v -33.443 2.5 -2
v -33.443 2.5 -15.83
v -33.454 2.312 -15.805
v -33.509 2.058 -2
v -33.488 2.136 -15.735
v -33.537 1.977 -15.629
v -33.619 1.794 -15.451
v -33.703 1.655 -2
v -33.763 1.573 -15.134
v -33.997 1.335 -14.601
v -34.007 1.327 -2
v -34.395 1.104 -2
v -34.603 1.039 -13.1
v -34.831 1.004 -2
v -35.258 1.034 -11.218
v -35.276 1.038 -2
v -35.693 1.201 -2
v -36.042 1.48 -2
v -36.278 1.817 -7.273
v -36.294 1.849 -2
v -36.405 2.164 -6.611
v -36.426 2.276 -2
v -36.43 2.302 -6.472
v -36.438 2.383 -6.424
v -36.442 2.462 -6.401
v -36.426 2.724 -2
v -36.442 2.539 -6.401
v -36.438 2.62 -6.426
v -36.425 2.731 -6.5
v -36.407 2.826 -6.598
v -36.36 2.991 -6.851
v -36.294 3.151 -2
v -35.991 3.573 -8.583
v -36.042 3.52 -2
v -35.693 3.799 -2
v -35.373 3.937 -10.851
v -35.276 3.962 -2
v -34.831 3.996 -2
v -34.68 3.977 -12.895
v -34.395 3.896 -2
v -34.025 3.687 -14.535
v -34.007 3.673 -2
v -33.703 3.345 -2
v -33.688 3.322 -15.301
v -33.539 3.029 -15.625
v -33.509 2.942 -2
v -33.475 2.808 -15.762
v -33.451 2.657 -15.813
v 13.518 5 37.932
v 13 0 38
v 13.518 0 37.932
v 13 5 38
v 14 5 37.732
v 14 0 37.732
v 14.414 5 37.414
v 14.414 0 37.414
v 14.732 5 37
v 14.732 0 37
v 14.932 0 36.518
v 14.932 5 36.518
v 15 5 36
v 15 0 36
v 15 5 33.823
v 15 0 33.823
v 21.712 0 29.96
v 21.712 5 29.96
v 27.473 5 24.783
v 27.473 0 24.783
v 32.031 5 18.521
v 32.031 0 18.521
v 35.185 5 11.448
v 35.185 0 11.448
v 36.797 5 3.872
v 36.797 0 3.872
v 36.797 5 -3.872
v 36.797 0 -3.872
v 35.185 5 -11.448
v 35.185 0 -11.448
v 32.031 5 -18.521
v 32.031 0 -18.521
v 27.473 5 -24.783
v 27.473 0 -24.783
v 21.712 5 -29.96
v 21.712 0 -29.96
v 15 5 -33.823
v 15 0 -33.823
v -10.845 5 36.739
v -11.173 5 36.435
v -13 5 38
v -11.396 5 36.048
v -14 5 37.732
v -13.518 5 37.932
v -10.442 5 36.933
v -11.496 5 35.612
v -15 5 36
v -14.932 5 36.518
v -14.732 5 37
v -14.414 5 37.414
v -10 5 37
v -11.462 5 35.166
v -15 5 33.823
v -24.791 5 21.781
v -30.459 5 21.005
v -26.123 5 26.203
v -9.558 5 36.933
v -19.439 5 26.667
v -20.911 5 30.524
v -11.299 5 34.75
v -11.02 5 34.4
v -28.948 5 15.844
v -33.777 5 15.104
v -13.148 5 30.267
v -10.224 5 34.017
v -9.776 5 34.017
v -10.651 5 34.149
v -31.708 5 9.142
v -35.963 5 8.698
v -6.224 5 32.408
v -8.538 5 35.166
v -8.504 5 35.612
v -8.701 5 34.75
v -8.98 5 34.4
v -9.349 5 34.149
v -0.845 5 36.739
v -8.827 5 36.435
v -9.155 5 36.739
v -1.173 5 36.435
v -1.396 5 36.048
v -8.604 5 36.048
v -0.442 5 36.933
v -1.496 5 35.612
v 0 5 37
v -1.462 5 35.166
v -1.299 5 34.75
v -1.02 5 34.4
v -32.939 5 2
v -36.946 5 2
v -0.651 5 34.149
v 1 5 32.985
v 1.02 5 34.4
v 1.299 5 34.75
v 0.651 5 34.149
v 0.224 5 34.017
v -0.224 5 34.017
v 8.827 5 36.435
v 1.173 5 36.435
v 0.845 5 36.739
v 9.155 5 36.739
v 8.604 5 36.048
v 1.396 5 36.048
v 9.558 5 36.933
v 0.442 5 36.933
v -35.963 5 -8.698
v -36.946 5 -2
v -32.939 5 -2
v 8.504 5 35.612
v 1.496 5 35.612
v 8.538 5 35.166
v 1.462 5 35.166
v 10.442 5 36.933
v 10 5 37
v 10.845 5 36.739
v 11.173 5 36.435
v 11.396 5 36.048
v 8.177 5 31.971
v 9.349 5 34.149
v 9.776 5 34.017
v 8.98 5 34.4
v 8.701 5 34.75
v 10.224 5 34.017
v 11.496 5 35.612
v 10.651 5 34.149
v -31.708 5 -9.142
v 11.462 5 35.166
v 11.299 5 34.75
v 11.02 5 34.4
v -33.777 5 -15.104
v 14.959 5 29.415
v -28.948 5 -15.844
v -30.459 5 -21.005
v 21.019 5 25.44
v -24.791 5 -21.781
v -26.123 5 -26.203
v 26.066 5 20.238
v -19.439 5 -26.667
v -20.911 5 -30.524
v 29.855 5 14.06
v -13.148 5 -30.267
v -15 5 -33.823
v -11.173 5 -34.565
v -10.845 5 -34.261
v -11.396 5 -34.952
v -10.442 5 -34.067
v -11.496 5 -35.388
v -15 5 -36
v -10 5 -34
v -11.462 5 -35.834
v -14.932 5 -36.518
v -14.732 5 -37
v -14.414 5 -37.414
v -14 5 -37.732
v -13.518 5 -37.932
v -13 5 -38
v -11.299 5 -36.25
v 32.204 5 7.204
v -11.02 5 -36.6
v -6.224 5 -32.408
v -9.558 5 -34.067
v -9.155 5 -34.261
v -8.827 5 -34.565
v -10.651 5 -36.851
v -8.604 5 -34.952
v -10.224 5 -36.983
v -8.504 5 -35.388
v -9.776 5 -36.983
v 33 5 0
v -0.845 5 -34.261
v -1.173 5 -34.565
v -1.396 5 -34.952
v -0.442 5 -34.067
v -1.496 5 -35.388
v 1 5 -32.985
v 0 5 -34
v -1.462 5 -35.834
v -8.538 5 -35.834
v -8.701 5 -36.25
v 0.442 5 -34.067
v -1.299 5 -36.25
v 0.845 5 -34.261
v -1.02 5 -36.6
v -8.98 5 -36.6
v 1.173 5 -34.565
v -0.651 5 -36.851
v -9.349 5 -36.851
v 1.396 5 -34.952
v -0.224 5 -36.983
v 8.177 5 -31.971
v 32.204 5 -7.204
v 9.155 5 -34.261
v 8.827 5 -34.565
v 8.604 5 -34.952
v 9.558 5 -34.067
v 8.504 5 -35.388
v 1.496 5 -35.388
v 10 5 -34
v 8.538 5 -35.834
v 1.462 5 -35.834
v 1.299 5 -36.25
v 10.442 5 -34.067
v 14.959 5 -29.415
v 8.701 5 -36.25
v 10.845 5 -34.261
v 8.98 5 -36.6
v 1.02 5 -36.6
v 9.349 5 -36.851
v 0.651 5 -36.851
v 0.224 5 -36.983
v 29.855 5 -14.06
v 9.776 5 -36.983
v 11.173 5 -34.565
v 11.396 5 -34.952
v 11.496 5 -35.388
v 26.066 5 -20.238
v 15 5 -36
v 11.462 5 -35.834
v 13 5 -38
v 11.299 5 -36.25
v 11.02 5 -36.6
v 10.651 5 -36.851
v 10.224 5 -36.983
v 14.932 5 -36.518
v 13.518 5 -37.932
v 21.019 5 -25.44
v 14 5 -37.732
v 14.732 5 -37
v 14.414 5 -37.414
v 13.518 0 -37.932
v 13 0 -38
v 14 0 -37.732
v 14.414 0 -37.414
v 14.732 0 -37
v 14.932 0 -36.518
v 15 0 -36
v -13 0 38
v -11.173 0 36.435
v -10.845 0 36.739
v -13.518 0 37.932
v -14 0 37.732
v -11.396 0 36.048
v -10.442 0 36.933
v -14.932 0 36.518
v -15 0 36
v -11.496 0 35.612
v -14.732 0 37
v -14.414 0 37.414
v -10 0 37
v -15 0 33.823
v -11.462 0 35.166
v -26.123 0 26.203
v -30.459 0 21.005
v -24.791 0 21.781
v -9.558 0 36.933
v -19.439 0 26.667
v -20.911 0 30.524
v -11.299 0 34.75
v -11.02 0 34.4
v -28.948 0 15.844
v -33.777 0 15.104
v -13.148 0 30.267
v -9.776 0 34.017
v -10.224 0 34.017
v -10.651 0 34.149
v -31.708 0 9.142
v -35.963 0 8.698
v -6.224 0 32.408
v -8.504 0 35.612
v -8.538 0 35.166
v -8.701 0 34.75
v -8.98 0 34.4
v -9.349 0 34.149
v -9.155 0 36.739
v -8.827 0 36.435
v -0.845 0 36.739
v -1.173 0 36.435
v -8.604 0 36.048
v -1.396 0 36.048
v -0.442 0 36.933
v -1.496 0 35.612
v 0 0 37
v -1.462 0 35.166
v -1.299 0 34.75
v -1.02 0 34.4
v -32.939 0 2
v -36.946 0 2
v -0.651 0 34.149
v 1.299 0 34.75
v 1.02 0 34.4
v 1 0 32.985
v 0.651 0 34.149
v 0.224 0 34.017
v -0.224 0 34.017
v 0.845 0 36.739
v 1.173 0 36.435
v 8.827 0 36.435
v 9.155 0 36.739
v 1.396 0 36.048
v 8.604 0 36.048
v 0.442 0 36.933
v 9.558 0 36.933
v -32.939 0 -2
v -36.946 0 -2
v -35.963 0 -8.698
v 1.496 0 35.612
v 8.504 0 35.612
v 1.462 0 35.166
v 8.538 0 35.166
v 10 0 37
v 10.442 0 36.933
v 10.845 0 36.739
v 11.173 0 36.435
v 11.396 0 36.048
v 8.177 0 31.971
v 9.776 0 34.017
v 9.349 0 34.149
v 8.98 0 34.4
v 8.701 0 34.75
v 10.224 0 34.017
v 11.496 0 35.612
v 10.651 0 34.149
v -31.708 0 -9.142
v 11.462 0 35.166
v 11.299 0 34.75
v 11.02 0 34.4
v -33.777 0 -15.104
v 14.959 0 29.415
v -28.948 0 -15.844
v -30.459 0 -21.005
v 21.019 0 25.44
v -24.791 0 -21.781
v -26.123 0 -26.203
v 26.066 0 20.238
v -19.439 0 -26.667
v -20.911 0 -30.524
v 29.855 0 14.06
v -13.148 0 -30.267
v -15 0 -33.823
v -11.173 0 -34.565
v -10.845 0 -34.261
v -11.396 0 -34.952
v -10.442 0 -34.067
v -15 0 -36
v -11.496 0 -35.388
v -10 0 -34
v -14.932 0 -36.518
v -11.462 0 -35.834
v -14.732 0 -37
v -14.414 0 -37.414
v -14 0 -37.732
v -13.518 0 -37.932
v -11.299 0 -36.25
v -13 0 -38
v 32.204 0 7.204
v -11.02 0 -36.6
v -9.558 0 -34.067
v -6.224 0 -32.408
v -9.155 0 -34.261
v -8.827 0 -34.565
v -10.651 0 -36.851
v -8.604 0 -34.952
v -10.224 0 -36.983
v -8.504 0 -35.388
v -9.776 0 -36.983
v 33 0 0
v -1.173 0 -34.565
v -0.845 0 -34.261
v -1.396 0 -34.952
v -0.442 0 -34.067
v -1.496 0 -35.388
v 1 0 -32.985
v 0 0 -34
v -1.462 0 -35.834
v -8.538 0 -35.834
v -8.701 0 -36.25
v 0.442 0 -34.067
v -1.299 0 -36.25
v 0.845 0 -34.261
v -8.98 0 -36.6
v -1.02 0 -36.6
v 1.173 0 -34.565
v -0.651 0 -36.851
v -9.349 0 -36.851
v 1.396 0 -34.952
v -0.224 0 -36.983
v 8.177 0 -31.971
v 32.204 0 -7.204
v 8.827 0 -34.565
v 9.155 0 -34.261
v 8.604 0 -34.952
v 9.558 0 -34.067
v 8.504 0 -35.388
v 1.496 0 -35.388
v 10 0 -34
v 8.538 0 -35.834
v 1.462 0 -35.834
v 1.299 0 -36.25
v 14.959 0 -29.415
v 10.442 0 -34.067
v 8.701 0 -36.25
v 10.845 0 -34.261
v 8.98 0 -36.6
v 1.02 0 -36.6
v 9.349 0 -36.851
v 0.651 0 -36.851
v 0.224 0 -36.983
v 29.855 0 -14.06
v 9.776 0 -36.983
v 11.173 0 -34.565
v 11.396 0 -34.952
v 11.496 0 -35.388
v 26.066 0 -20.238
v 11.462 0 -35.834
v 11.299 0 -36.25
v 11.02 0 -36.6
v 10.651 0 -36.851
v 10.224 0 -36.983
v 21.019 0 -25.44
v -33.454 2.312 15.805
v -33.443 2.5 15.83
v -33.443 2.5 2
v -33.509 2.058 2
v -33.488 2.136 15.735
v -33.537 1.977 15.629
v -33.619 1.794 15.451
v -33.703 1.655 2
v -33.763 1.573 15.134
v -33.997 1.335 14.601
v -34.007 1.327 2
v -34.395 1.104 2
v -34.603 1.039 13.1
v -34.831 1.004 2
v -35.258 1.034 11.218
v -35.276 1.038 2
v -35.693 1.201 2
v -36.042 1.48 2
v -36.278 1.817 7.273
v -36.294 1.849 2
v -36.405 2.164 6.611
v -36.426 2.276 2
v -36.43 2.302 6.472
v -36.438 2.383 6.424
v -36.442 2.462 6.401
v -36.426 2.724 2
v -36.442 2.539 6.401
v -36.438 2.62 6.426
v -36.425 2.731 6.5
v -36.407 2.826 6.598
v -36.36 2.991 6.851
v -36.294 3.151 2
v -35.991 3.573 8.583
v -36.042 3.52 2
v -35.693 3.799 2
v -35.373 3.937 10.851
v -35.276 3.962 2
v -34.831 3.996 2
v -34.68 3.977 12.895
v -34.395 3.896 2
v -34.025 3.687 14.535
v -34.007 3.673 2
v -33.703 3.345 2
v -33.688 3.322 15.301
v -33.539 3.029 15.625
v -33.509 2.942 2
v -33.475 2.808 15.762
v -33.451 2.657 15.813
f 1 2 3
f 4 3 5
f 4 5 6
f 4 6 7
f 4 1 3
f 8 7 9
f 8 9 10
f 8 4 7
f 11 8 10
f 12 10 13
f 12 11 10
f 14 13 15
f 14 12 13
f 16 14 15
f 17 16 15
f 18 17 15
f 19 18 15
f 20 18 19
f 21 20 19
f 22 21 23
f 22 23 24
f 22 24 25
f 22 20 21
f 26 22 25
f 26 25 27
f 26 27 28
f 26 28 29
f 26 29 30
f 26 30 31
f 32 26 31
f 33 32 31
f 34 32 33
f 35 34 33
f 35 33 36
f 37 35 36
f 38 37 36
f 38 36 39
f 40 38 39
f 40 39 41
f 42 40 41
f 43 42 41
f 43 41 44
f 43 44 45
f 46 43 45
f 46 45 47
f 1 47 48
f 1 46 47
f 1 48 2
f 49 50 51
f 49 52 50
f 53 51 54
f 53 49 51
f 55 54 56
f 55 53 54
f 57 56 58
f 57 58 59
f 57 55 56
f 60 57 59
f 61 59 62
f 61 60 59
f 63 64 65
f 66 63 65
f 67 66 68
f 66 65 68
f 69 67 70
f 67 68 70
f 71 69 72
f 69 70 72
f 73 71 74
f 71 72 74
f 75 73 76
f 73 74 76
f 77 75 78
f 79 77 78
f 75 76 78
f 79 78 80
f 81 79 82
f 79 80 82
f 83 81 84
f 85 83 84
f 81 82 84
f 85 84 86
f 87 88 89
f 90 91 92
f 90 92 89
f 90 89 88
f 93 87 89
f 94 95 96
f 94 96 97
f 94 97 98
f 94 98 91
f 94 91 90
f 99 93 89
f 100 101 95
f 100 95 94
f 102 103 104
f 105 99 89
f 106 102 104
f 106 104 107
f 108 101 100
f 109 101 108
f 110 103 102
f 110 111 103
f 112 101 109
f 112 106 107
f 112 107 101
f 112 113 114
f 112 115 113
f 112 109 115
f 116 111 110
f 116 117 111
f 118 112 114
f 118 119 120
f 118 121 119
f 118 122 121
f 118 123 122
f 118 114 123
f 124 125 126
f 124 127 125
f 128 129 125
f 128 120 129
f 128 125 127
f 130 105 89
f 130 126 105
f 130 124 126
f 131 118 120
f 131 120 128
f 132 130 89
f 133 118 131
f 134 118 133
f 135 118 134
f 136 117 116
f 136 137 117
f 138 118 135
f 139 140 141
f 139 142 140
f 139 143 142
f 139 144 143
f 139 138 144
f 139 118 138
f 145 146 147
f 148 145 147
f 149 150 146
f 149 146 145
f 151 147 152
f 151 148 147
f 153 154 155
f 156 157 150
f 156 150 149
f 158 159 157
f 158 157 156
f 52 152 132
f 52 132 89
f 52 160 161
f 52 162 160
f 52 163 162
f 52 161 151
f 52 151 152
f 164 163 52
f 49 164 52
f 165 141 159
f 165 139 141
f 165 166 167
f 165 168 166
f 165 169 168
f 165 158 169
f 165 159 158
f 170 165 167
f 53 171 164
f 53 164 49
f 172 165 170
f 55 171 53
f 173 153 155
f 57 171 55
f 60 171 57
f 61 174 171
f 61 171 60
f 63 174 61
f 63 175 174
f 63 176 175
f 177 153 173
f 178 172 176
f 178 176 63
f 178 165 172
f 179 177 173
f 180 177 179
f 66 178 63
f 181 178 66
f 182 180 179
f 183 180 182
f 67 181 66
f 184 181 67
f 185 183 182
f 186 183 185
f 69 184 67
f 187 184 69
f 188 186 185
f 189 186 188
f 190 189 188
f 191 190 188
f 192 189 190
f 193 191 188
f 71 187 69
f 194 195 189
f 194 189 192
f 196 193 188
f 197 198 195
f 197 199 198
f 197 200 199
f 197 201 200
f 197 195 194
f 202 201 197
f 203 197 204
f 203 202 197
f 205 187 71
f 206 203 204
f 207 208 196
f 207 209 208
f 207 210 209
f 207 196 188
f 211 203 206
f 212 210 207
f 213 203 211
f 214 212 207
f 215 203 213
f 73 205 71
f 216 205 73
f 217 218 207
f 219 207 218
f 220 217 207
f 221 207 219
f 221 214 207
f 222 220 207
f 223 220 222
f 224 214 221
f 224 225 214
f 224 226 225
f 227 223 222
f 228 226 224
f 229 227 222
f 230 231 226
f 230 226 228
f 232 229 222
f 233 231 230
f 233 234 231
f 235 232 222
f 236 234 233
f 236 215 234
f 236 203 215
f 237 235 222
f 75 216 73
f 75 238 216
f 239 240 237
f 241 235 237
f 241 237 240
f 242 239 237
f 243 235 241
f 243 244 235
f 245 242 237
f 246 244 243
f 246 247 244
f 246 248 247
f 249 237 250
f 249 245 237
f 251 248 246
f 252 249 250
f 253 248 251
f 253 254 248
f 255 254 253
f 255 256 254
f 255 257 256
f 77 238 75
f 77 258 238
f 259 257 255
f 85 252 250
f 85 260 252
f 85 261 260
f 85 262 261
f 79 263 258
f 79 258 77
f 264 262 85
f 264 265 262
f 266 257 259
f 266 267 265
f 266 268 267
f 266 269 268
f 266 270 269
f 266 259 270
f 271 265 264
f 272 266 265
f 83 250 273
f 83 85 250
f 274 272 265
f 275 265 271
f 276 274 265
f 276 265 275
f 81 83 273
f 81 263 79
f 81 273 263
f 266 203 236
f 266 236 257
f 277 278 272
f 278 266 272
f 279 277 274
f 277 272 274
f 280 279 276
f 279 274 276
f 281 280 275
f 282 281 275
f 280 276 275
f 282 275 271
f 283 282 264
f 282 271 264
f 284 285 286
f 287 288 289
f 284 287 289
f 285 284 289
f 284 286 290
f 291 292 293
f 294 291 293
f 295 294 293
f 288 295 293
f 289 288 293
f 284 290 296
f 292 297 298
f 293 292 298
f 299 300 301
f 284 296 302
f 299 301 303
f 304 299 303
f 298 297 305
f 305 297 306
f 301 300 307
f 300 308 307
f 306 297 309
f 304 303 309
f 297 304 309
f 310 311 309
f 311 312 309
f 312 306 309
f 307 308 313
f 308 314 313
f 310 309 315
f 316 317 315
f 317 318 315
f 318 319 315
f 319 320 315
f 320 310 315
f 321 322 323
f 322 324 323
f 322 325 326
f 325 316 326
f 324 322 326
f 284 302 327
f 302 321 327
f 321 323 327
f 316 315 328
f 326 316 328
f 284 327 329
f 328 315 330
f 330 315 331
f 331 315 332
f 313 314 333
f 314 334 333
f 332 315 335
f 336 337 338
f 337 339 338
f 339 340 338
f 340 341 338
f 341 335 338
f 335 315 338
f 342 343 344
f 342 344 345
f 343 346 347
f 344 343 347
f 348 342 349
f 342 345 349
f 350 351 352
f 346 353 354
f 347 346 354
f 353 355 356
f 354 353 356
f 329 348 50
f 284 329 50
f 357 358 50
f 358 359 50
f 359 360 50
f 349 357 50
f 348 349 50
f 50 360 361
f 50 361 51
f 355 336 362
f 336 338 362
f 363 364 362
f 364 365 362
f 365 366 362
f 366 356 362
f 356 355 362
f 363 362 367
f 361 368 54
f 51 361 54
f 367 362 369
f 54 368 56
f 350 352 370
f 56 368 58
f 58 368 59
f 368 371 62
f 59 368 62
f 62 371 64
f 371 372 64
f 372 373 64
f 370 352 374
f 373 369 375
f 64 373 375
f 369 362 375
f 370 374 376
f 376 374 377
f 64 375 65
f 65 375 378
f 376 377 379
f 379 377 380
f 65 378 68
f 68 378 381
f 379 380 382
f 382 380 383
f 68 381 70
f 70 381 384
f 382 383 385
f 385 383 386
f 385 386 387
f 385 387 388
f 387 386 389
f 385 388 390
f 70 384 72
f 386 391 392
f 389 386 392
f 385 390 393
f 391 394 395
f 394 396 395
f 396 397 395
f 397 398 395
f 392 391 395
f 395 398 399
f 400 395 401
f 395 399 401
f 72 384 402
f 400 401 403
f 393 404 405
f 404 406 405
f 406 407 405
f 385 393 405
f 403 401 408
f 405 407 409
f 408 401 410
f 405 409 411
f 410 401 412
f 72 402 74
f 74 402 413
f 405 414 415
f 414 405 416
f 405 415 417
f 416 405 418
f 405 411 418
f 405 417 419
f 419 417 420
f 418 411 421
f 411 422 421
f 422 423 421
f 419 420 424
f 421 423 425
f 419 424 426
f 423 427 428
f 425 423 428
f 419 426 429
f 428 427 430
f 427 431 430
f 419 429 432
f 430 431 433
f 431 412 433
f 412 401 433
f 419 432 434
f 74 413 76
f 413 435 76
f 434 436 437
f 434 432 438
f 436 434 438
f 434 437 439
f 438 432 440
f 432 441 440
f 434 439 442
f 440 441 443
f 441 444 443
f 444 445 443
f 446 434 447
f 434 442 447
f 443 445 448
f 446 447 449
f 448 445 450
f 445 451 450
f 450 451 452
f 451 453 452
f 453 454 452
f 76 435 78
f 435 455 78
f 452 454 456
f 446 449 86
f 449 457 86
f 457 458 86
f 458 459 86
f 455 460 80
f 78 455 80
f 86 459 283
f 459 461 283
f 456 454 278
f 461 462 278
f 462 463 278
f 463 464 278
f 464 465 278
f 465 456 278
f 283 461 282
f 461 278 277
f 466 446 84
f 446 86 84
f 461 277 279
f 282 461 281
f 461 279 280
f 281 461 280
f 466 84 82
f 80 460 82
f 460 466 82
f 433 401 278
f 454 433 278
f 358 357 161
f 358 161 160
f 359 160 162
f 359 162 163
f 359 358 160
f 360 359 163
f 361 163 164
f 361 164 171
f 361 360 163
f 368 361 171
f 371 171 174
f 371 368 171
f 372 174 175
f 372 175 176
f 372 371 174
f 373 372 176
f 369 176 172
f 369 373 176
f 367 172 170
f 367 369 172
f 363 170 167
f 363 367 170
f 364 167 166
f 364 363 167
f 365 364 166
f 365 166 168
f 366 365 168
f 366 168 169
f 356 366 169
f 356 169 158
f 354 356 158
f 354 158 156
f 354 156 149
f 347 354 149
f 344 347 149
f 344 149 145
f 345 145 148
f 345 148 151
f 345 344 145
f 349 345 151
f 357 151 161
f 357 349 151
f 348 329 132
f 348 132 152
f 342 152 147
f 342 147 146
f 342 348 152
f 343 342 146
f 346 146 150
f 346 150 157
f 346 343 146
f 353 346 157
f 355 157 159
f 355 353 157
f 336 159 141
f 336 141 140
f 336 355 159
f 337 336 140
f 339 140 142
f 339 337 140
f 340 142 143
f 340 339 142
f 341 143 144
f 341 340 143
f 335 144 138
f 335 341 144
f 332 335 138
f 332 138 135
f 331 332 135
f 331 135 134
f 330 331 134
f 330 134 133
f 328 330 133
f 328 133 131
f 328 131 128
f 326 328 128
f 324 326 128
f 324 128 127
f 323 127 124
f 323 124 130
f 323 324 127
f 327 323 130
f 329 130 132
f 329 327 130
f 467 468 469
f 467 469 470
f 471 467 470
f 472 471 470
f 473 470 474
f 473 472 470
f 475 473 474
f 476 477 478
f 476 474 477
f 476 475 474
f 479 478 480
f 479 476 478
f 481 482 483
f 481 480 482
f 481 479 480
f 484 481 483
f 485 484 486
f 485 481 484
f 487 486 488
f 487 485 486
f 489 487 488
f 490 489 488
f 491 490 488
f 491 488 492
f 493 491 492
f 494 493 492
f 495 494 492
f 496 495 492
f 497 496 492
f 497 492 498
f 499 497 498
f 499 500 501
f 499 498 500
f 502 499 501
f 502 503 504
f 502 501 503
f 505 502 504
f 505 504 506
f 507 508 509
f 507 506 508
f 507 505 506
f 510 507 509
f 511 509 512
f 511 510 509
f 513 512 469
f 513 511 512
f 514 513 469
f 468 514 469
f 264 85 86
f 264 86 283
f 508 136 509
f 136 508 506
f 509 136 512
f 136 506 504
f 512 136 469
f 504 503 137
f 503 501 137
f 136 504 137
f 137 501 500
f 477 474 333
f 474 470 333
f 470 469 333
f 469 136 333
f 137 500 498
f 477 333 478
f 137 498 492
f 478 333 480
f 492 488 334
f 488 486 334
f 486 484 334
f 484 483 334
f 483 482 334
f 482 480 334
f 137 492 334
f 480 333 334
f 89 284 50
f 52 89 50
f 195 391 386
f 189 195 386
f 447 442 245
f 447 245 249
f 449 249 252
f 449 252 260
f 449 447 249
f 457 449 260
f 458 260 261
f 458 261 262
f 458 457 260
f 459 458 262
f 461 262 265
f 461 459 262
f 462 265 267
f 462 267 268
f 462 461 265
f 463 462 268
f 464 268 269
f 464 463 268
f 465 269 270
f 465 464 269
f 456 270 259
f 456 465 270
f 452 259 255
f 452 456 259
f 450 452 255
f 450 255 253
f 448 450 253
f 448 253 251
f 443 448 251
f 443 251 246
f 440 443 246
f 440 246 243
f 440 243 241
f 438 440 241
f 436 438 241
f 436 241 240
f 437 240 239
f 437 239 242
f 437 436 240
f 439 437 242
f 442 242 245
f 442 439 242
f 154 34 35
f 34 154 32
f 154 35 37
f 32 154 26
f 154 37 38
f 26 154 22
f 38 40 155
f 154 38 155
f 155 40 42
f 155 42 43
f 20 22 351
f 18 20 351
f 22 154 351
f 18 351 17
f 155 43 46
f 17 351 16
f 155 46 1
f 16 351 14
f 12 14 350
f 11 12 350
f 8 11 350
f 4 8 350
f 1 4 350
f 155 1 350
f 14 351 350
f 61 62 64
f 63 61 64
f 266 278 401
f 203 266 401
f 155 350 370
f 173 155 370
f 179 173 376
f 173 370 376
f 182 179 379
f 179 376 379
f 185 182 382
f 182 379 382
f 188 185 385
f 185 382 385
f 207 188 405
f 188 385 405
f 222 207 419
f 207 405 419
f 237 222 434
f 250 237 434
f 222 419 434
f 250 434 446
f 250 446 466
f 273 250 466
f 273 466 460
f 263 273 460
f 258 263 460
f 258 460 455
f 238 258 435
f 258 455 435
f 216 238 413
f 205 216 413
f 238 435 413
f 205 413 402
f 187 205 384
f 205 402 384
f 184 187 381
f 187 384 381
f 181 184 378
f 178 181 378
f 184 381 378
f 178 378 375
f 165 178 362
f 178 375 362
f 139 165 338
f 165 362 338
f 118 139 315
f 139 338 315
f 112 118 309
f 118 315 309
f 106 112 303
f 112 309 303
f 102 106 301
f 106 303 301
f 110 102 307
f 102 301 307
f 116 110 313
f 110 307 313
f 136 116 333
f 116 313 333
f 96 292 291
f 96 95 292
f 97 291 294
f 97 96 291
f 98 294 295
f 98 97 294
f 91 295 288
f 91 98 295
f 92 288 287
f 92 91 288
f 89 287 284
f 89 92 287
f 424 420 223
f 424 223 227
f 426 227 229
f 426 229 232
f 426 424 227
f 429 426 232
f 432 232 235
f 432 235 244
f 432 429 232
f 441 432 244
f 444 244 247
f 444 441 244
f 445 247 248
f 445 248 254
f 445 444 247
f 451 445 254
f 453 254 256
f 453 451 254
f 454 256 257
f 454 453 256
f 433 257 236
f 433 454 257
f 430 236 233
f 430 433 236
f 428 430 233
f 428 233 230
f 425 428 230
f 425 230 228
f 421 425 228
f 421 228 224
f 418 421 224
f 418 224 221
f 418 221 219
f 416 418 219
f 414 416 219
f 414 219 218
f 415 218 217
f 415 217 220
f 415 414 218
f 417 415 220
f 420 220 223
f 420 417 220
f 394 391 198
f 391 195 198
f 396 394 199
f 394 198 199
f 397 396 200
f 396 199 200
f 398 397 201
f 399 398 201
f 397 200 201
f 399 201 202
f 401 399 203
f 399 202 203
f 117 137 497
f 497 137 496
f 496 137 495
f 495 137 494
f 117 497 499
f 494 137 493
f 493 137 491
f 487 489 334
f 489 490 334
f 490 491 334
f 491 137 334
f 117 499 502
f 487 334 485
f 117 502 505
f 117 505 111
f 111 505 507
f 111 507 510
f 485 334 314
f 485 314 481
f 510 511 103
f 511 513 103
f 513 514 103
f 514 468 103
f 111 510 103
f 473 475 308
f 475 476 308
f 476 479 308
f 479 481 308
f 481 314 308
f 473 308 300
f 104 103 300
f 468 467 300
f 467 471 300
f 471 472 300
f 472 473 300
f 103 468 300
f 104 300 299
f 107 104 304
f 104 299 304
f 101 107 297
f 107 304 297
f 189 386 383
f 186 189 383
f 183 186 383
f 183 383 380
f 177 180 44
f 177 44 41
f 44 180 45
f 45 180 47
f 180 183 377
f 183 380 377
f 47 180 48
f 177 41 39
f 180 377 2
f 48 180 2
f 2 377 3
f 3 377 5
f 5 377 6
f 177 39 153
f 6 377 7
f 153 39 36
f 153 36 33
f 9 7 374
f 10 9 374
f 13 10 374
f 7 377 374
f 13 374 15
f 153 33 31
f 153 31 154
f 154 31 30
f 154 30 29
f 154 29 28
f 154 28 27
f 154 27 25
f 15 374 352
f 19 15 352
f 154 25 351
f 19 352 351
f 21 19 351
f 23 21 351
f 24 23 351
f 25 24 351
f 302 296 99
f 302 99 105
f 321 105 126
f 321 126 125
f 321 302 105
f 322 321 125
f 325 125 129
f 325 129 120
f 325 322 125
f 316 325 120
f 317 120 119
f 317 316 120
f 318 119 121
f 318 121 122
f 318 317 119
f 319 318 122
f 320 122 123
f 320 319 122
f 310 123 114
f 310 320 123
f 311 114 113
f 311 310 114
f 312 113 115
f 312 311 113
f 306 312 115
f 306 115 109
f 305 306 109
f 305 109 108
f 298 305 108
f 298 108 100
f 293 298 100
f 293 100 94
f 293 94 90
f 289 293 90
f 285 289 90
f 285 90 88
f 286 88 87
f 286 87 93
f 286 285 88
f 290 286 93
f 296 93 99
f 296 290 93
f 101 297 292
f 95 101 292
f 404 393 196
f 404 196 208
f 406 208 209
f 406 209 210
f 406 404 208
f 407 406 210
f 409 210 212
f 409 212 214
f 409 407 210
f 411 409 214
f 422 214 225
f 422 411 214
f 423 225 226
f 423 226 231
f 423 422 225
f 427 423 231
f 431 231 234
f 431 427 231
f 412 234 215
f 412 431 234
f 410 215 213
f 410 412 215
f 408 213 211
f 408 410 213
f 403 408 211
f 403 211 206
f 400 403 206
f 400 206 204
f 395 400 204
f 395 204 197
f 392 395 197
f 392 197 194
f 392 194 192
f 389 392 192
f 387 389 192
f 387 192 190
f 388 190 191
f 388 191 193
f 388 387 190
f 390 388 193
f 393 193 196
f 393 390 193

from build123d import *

# Parameters (mm, degrees)
CROQUIS1_R                 = 1.5
SALIENTE_EXTRUIR1_DEPTH    = 5
REDONDEO1_R                = 2
CORTAR_EXTRUIR1_DEPTH      = 20
CORTAR_EXTRUIR1_DEPTH_BACK = 15
CROQUIS3_R                 = 1.5


with BuildPart() as part:
    # Croquis1 → Saliente-Extruir1 (new body)
    with BuildSketch(Plane(origin=(0, 0, 0), x_dir=(1, 0, 0), z_dir=(0, 1, 0))):
        with BuildLine():
            Line((-32.939338184, -2), (-36.945906404, -2))
            ThreePointArc((-36.945906404, -2), (-30.459337304, -21.005446223), (-15, -33.823069051))
            Line((-15, -33.823069051), (-15, -38))
            Line((-15, -38), (15, -38))
            Line((15, -38), (15, -33.823069051))
            ThreePointArc((15, -33.823069051), (37, 0), (15, 33.823069051))
            Line((15, 33.823069051), (15, 38))
            Line((15, 38), (-15, 38))
            Line((-15, 38), (-15, 33.823069051))
            ThreePointArc((-15, 33.823069051), (-30.459337304, 21.005446223), (-36.945906404, 2))
            Line((-36.945906404, 2), (-32.939338184, 2))
            ThreePointArc((-32.939338184, 2), (33, 0), (-32.939338184, -2))
        make_face()
        with Locations((0, -35.5)):
            Circle(CROQUIS1_R, mode=Mode.SUBTRACT)
        with Locations((10, -35.5)):
            Circle(CROQUIS1_R, mode=Mode.SUBTRACT)
        with Locations((-10, -35.5)):
            Circle(CROQUIS1_R, mode=Mode.SUBTRACT)
        with Locations((-10, 35.5)):
            Circle(CROQUIS1_R, mode=Mode.SUBTRACT)
        with Locations((10, 35.5)):
            Circle(CROQUIS1_R, mode=Mode.SUBTRACT)
        with Locations((0, 35.5)):
            Circle(CROQUIS1_R, mode=Mode.SUBTRACT)
    extrude(amount=SALIENTE_EXTRUIR1_DEPTH)

    # Redondeo1
    redondeo1_edges = [part.edges().sort_by_distance(p)[0] for p in [
        (15, 2.5, 38),
        (-15, 2.5, 38),
        (-15, 2.5, -38),
        (15, 2.5, -38),
    ]]
    fillet(redondeo1_edges, radius=REDONDEO1_R)

    # Croquis3 → Cortar-Extruir1 (cut, two sides: drawn at the far end of the back side and taken through both)
    with BuildSketch(Plane(origin=(0, 0, 2), x_dir=(-1, 0, 0), z_dir=(0, 0, -1)).offset(-CORTAR_EXTRUIR1_DEPTH_BACK)):
        with Locations((34.942622294, 2.5)):
            Circle(CROQUIS3_R)
    extrude(amount=CORTAR_EXTRUIR1_DEPTH + CORTAR_EXTRUIR1_DEPTH_BACK, mode=Mode.SUBTRACT)


solid = part.part
